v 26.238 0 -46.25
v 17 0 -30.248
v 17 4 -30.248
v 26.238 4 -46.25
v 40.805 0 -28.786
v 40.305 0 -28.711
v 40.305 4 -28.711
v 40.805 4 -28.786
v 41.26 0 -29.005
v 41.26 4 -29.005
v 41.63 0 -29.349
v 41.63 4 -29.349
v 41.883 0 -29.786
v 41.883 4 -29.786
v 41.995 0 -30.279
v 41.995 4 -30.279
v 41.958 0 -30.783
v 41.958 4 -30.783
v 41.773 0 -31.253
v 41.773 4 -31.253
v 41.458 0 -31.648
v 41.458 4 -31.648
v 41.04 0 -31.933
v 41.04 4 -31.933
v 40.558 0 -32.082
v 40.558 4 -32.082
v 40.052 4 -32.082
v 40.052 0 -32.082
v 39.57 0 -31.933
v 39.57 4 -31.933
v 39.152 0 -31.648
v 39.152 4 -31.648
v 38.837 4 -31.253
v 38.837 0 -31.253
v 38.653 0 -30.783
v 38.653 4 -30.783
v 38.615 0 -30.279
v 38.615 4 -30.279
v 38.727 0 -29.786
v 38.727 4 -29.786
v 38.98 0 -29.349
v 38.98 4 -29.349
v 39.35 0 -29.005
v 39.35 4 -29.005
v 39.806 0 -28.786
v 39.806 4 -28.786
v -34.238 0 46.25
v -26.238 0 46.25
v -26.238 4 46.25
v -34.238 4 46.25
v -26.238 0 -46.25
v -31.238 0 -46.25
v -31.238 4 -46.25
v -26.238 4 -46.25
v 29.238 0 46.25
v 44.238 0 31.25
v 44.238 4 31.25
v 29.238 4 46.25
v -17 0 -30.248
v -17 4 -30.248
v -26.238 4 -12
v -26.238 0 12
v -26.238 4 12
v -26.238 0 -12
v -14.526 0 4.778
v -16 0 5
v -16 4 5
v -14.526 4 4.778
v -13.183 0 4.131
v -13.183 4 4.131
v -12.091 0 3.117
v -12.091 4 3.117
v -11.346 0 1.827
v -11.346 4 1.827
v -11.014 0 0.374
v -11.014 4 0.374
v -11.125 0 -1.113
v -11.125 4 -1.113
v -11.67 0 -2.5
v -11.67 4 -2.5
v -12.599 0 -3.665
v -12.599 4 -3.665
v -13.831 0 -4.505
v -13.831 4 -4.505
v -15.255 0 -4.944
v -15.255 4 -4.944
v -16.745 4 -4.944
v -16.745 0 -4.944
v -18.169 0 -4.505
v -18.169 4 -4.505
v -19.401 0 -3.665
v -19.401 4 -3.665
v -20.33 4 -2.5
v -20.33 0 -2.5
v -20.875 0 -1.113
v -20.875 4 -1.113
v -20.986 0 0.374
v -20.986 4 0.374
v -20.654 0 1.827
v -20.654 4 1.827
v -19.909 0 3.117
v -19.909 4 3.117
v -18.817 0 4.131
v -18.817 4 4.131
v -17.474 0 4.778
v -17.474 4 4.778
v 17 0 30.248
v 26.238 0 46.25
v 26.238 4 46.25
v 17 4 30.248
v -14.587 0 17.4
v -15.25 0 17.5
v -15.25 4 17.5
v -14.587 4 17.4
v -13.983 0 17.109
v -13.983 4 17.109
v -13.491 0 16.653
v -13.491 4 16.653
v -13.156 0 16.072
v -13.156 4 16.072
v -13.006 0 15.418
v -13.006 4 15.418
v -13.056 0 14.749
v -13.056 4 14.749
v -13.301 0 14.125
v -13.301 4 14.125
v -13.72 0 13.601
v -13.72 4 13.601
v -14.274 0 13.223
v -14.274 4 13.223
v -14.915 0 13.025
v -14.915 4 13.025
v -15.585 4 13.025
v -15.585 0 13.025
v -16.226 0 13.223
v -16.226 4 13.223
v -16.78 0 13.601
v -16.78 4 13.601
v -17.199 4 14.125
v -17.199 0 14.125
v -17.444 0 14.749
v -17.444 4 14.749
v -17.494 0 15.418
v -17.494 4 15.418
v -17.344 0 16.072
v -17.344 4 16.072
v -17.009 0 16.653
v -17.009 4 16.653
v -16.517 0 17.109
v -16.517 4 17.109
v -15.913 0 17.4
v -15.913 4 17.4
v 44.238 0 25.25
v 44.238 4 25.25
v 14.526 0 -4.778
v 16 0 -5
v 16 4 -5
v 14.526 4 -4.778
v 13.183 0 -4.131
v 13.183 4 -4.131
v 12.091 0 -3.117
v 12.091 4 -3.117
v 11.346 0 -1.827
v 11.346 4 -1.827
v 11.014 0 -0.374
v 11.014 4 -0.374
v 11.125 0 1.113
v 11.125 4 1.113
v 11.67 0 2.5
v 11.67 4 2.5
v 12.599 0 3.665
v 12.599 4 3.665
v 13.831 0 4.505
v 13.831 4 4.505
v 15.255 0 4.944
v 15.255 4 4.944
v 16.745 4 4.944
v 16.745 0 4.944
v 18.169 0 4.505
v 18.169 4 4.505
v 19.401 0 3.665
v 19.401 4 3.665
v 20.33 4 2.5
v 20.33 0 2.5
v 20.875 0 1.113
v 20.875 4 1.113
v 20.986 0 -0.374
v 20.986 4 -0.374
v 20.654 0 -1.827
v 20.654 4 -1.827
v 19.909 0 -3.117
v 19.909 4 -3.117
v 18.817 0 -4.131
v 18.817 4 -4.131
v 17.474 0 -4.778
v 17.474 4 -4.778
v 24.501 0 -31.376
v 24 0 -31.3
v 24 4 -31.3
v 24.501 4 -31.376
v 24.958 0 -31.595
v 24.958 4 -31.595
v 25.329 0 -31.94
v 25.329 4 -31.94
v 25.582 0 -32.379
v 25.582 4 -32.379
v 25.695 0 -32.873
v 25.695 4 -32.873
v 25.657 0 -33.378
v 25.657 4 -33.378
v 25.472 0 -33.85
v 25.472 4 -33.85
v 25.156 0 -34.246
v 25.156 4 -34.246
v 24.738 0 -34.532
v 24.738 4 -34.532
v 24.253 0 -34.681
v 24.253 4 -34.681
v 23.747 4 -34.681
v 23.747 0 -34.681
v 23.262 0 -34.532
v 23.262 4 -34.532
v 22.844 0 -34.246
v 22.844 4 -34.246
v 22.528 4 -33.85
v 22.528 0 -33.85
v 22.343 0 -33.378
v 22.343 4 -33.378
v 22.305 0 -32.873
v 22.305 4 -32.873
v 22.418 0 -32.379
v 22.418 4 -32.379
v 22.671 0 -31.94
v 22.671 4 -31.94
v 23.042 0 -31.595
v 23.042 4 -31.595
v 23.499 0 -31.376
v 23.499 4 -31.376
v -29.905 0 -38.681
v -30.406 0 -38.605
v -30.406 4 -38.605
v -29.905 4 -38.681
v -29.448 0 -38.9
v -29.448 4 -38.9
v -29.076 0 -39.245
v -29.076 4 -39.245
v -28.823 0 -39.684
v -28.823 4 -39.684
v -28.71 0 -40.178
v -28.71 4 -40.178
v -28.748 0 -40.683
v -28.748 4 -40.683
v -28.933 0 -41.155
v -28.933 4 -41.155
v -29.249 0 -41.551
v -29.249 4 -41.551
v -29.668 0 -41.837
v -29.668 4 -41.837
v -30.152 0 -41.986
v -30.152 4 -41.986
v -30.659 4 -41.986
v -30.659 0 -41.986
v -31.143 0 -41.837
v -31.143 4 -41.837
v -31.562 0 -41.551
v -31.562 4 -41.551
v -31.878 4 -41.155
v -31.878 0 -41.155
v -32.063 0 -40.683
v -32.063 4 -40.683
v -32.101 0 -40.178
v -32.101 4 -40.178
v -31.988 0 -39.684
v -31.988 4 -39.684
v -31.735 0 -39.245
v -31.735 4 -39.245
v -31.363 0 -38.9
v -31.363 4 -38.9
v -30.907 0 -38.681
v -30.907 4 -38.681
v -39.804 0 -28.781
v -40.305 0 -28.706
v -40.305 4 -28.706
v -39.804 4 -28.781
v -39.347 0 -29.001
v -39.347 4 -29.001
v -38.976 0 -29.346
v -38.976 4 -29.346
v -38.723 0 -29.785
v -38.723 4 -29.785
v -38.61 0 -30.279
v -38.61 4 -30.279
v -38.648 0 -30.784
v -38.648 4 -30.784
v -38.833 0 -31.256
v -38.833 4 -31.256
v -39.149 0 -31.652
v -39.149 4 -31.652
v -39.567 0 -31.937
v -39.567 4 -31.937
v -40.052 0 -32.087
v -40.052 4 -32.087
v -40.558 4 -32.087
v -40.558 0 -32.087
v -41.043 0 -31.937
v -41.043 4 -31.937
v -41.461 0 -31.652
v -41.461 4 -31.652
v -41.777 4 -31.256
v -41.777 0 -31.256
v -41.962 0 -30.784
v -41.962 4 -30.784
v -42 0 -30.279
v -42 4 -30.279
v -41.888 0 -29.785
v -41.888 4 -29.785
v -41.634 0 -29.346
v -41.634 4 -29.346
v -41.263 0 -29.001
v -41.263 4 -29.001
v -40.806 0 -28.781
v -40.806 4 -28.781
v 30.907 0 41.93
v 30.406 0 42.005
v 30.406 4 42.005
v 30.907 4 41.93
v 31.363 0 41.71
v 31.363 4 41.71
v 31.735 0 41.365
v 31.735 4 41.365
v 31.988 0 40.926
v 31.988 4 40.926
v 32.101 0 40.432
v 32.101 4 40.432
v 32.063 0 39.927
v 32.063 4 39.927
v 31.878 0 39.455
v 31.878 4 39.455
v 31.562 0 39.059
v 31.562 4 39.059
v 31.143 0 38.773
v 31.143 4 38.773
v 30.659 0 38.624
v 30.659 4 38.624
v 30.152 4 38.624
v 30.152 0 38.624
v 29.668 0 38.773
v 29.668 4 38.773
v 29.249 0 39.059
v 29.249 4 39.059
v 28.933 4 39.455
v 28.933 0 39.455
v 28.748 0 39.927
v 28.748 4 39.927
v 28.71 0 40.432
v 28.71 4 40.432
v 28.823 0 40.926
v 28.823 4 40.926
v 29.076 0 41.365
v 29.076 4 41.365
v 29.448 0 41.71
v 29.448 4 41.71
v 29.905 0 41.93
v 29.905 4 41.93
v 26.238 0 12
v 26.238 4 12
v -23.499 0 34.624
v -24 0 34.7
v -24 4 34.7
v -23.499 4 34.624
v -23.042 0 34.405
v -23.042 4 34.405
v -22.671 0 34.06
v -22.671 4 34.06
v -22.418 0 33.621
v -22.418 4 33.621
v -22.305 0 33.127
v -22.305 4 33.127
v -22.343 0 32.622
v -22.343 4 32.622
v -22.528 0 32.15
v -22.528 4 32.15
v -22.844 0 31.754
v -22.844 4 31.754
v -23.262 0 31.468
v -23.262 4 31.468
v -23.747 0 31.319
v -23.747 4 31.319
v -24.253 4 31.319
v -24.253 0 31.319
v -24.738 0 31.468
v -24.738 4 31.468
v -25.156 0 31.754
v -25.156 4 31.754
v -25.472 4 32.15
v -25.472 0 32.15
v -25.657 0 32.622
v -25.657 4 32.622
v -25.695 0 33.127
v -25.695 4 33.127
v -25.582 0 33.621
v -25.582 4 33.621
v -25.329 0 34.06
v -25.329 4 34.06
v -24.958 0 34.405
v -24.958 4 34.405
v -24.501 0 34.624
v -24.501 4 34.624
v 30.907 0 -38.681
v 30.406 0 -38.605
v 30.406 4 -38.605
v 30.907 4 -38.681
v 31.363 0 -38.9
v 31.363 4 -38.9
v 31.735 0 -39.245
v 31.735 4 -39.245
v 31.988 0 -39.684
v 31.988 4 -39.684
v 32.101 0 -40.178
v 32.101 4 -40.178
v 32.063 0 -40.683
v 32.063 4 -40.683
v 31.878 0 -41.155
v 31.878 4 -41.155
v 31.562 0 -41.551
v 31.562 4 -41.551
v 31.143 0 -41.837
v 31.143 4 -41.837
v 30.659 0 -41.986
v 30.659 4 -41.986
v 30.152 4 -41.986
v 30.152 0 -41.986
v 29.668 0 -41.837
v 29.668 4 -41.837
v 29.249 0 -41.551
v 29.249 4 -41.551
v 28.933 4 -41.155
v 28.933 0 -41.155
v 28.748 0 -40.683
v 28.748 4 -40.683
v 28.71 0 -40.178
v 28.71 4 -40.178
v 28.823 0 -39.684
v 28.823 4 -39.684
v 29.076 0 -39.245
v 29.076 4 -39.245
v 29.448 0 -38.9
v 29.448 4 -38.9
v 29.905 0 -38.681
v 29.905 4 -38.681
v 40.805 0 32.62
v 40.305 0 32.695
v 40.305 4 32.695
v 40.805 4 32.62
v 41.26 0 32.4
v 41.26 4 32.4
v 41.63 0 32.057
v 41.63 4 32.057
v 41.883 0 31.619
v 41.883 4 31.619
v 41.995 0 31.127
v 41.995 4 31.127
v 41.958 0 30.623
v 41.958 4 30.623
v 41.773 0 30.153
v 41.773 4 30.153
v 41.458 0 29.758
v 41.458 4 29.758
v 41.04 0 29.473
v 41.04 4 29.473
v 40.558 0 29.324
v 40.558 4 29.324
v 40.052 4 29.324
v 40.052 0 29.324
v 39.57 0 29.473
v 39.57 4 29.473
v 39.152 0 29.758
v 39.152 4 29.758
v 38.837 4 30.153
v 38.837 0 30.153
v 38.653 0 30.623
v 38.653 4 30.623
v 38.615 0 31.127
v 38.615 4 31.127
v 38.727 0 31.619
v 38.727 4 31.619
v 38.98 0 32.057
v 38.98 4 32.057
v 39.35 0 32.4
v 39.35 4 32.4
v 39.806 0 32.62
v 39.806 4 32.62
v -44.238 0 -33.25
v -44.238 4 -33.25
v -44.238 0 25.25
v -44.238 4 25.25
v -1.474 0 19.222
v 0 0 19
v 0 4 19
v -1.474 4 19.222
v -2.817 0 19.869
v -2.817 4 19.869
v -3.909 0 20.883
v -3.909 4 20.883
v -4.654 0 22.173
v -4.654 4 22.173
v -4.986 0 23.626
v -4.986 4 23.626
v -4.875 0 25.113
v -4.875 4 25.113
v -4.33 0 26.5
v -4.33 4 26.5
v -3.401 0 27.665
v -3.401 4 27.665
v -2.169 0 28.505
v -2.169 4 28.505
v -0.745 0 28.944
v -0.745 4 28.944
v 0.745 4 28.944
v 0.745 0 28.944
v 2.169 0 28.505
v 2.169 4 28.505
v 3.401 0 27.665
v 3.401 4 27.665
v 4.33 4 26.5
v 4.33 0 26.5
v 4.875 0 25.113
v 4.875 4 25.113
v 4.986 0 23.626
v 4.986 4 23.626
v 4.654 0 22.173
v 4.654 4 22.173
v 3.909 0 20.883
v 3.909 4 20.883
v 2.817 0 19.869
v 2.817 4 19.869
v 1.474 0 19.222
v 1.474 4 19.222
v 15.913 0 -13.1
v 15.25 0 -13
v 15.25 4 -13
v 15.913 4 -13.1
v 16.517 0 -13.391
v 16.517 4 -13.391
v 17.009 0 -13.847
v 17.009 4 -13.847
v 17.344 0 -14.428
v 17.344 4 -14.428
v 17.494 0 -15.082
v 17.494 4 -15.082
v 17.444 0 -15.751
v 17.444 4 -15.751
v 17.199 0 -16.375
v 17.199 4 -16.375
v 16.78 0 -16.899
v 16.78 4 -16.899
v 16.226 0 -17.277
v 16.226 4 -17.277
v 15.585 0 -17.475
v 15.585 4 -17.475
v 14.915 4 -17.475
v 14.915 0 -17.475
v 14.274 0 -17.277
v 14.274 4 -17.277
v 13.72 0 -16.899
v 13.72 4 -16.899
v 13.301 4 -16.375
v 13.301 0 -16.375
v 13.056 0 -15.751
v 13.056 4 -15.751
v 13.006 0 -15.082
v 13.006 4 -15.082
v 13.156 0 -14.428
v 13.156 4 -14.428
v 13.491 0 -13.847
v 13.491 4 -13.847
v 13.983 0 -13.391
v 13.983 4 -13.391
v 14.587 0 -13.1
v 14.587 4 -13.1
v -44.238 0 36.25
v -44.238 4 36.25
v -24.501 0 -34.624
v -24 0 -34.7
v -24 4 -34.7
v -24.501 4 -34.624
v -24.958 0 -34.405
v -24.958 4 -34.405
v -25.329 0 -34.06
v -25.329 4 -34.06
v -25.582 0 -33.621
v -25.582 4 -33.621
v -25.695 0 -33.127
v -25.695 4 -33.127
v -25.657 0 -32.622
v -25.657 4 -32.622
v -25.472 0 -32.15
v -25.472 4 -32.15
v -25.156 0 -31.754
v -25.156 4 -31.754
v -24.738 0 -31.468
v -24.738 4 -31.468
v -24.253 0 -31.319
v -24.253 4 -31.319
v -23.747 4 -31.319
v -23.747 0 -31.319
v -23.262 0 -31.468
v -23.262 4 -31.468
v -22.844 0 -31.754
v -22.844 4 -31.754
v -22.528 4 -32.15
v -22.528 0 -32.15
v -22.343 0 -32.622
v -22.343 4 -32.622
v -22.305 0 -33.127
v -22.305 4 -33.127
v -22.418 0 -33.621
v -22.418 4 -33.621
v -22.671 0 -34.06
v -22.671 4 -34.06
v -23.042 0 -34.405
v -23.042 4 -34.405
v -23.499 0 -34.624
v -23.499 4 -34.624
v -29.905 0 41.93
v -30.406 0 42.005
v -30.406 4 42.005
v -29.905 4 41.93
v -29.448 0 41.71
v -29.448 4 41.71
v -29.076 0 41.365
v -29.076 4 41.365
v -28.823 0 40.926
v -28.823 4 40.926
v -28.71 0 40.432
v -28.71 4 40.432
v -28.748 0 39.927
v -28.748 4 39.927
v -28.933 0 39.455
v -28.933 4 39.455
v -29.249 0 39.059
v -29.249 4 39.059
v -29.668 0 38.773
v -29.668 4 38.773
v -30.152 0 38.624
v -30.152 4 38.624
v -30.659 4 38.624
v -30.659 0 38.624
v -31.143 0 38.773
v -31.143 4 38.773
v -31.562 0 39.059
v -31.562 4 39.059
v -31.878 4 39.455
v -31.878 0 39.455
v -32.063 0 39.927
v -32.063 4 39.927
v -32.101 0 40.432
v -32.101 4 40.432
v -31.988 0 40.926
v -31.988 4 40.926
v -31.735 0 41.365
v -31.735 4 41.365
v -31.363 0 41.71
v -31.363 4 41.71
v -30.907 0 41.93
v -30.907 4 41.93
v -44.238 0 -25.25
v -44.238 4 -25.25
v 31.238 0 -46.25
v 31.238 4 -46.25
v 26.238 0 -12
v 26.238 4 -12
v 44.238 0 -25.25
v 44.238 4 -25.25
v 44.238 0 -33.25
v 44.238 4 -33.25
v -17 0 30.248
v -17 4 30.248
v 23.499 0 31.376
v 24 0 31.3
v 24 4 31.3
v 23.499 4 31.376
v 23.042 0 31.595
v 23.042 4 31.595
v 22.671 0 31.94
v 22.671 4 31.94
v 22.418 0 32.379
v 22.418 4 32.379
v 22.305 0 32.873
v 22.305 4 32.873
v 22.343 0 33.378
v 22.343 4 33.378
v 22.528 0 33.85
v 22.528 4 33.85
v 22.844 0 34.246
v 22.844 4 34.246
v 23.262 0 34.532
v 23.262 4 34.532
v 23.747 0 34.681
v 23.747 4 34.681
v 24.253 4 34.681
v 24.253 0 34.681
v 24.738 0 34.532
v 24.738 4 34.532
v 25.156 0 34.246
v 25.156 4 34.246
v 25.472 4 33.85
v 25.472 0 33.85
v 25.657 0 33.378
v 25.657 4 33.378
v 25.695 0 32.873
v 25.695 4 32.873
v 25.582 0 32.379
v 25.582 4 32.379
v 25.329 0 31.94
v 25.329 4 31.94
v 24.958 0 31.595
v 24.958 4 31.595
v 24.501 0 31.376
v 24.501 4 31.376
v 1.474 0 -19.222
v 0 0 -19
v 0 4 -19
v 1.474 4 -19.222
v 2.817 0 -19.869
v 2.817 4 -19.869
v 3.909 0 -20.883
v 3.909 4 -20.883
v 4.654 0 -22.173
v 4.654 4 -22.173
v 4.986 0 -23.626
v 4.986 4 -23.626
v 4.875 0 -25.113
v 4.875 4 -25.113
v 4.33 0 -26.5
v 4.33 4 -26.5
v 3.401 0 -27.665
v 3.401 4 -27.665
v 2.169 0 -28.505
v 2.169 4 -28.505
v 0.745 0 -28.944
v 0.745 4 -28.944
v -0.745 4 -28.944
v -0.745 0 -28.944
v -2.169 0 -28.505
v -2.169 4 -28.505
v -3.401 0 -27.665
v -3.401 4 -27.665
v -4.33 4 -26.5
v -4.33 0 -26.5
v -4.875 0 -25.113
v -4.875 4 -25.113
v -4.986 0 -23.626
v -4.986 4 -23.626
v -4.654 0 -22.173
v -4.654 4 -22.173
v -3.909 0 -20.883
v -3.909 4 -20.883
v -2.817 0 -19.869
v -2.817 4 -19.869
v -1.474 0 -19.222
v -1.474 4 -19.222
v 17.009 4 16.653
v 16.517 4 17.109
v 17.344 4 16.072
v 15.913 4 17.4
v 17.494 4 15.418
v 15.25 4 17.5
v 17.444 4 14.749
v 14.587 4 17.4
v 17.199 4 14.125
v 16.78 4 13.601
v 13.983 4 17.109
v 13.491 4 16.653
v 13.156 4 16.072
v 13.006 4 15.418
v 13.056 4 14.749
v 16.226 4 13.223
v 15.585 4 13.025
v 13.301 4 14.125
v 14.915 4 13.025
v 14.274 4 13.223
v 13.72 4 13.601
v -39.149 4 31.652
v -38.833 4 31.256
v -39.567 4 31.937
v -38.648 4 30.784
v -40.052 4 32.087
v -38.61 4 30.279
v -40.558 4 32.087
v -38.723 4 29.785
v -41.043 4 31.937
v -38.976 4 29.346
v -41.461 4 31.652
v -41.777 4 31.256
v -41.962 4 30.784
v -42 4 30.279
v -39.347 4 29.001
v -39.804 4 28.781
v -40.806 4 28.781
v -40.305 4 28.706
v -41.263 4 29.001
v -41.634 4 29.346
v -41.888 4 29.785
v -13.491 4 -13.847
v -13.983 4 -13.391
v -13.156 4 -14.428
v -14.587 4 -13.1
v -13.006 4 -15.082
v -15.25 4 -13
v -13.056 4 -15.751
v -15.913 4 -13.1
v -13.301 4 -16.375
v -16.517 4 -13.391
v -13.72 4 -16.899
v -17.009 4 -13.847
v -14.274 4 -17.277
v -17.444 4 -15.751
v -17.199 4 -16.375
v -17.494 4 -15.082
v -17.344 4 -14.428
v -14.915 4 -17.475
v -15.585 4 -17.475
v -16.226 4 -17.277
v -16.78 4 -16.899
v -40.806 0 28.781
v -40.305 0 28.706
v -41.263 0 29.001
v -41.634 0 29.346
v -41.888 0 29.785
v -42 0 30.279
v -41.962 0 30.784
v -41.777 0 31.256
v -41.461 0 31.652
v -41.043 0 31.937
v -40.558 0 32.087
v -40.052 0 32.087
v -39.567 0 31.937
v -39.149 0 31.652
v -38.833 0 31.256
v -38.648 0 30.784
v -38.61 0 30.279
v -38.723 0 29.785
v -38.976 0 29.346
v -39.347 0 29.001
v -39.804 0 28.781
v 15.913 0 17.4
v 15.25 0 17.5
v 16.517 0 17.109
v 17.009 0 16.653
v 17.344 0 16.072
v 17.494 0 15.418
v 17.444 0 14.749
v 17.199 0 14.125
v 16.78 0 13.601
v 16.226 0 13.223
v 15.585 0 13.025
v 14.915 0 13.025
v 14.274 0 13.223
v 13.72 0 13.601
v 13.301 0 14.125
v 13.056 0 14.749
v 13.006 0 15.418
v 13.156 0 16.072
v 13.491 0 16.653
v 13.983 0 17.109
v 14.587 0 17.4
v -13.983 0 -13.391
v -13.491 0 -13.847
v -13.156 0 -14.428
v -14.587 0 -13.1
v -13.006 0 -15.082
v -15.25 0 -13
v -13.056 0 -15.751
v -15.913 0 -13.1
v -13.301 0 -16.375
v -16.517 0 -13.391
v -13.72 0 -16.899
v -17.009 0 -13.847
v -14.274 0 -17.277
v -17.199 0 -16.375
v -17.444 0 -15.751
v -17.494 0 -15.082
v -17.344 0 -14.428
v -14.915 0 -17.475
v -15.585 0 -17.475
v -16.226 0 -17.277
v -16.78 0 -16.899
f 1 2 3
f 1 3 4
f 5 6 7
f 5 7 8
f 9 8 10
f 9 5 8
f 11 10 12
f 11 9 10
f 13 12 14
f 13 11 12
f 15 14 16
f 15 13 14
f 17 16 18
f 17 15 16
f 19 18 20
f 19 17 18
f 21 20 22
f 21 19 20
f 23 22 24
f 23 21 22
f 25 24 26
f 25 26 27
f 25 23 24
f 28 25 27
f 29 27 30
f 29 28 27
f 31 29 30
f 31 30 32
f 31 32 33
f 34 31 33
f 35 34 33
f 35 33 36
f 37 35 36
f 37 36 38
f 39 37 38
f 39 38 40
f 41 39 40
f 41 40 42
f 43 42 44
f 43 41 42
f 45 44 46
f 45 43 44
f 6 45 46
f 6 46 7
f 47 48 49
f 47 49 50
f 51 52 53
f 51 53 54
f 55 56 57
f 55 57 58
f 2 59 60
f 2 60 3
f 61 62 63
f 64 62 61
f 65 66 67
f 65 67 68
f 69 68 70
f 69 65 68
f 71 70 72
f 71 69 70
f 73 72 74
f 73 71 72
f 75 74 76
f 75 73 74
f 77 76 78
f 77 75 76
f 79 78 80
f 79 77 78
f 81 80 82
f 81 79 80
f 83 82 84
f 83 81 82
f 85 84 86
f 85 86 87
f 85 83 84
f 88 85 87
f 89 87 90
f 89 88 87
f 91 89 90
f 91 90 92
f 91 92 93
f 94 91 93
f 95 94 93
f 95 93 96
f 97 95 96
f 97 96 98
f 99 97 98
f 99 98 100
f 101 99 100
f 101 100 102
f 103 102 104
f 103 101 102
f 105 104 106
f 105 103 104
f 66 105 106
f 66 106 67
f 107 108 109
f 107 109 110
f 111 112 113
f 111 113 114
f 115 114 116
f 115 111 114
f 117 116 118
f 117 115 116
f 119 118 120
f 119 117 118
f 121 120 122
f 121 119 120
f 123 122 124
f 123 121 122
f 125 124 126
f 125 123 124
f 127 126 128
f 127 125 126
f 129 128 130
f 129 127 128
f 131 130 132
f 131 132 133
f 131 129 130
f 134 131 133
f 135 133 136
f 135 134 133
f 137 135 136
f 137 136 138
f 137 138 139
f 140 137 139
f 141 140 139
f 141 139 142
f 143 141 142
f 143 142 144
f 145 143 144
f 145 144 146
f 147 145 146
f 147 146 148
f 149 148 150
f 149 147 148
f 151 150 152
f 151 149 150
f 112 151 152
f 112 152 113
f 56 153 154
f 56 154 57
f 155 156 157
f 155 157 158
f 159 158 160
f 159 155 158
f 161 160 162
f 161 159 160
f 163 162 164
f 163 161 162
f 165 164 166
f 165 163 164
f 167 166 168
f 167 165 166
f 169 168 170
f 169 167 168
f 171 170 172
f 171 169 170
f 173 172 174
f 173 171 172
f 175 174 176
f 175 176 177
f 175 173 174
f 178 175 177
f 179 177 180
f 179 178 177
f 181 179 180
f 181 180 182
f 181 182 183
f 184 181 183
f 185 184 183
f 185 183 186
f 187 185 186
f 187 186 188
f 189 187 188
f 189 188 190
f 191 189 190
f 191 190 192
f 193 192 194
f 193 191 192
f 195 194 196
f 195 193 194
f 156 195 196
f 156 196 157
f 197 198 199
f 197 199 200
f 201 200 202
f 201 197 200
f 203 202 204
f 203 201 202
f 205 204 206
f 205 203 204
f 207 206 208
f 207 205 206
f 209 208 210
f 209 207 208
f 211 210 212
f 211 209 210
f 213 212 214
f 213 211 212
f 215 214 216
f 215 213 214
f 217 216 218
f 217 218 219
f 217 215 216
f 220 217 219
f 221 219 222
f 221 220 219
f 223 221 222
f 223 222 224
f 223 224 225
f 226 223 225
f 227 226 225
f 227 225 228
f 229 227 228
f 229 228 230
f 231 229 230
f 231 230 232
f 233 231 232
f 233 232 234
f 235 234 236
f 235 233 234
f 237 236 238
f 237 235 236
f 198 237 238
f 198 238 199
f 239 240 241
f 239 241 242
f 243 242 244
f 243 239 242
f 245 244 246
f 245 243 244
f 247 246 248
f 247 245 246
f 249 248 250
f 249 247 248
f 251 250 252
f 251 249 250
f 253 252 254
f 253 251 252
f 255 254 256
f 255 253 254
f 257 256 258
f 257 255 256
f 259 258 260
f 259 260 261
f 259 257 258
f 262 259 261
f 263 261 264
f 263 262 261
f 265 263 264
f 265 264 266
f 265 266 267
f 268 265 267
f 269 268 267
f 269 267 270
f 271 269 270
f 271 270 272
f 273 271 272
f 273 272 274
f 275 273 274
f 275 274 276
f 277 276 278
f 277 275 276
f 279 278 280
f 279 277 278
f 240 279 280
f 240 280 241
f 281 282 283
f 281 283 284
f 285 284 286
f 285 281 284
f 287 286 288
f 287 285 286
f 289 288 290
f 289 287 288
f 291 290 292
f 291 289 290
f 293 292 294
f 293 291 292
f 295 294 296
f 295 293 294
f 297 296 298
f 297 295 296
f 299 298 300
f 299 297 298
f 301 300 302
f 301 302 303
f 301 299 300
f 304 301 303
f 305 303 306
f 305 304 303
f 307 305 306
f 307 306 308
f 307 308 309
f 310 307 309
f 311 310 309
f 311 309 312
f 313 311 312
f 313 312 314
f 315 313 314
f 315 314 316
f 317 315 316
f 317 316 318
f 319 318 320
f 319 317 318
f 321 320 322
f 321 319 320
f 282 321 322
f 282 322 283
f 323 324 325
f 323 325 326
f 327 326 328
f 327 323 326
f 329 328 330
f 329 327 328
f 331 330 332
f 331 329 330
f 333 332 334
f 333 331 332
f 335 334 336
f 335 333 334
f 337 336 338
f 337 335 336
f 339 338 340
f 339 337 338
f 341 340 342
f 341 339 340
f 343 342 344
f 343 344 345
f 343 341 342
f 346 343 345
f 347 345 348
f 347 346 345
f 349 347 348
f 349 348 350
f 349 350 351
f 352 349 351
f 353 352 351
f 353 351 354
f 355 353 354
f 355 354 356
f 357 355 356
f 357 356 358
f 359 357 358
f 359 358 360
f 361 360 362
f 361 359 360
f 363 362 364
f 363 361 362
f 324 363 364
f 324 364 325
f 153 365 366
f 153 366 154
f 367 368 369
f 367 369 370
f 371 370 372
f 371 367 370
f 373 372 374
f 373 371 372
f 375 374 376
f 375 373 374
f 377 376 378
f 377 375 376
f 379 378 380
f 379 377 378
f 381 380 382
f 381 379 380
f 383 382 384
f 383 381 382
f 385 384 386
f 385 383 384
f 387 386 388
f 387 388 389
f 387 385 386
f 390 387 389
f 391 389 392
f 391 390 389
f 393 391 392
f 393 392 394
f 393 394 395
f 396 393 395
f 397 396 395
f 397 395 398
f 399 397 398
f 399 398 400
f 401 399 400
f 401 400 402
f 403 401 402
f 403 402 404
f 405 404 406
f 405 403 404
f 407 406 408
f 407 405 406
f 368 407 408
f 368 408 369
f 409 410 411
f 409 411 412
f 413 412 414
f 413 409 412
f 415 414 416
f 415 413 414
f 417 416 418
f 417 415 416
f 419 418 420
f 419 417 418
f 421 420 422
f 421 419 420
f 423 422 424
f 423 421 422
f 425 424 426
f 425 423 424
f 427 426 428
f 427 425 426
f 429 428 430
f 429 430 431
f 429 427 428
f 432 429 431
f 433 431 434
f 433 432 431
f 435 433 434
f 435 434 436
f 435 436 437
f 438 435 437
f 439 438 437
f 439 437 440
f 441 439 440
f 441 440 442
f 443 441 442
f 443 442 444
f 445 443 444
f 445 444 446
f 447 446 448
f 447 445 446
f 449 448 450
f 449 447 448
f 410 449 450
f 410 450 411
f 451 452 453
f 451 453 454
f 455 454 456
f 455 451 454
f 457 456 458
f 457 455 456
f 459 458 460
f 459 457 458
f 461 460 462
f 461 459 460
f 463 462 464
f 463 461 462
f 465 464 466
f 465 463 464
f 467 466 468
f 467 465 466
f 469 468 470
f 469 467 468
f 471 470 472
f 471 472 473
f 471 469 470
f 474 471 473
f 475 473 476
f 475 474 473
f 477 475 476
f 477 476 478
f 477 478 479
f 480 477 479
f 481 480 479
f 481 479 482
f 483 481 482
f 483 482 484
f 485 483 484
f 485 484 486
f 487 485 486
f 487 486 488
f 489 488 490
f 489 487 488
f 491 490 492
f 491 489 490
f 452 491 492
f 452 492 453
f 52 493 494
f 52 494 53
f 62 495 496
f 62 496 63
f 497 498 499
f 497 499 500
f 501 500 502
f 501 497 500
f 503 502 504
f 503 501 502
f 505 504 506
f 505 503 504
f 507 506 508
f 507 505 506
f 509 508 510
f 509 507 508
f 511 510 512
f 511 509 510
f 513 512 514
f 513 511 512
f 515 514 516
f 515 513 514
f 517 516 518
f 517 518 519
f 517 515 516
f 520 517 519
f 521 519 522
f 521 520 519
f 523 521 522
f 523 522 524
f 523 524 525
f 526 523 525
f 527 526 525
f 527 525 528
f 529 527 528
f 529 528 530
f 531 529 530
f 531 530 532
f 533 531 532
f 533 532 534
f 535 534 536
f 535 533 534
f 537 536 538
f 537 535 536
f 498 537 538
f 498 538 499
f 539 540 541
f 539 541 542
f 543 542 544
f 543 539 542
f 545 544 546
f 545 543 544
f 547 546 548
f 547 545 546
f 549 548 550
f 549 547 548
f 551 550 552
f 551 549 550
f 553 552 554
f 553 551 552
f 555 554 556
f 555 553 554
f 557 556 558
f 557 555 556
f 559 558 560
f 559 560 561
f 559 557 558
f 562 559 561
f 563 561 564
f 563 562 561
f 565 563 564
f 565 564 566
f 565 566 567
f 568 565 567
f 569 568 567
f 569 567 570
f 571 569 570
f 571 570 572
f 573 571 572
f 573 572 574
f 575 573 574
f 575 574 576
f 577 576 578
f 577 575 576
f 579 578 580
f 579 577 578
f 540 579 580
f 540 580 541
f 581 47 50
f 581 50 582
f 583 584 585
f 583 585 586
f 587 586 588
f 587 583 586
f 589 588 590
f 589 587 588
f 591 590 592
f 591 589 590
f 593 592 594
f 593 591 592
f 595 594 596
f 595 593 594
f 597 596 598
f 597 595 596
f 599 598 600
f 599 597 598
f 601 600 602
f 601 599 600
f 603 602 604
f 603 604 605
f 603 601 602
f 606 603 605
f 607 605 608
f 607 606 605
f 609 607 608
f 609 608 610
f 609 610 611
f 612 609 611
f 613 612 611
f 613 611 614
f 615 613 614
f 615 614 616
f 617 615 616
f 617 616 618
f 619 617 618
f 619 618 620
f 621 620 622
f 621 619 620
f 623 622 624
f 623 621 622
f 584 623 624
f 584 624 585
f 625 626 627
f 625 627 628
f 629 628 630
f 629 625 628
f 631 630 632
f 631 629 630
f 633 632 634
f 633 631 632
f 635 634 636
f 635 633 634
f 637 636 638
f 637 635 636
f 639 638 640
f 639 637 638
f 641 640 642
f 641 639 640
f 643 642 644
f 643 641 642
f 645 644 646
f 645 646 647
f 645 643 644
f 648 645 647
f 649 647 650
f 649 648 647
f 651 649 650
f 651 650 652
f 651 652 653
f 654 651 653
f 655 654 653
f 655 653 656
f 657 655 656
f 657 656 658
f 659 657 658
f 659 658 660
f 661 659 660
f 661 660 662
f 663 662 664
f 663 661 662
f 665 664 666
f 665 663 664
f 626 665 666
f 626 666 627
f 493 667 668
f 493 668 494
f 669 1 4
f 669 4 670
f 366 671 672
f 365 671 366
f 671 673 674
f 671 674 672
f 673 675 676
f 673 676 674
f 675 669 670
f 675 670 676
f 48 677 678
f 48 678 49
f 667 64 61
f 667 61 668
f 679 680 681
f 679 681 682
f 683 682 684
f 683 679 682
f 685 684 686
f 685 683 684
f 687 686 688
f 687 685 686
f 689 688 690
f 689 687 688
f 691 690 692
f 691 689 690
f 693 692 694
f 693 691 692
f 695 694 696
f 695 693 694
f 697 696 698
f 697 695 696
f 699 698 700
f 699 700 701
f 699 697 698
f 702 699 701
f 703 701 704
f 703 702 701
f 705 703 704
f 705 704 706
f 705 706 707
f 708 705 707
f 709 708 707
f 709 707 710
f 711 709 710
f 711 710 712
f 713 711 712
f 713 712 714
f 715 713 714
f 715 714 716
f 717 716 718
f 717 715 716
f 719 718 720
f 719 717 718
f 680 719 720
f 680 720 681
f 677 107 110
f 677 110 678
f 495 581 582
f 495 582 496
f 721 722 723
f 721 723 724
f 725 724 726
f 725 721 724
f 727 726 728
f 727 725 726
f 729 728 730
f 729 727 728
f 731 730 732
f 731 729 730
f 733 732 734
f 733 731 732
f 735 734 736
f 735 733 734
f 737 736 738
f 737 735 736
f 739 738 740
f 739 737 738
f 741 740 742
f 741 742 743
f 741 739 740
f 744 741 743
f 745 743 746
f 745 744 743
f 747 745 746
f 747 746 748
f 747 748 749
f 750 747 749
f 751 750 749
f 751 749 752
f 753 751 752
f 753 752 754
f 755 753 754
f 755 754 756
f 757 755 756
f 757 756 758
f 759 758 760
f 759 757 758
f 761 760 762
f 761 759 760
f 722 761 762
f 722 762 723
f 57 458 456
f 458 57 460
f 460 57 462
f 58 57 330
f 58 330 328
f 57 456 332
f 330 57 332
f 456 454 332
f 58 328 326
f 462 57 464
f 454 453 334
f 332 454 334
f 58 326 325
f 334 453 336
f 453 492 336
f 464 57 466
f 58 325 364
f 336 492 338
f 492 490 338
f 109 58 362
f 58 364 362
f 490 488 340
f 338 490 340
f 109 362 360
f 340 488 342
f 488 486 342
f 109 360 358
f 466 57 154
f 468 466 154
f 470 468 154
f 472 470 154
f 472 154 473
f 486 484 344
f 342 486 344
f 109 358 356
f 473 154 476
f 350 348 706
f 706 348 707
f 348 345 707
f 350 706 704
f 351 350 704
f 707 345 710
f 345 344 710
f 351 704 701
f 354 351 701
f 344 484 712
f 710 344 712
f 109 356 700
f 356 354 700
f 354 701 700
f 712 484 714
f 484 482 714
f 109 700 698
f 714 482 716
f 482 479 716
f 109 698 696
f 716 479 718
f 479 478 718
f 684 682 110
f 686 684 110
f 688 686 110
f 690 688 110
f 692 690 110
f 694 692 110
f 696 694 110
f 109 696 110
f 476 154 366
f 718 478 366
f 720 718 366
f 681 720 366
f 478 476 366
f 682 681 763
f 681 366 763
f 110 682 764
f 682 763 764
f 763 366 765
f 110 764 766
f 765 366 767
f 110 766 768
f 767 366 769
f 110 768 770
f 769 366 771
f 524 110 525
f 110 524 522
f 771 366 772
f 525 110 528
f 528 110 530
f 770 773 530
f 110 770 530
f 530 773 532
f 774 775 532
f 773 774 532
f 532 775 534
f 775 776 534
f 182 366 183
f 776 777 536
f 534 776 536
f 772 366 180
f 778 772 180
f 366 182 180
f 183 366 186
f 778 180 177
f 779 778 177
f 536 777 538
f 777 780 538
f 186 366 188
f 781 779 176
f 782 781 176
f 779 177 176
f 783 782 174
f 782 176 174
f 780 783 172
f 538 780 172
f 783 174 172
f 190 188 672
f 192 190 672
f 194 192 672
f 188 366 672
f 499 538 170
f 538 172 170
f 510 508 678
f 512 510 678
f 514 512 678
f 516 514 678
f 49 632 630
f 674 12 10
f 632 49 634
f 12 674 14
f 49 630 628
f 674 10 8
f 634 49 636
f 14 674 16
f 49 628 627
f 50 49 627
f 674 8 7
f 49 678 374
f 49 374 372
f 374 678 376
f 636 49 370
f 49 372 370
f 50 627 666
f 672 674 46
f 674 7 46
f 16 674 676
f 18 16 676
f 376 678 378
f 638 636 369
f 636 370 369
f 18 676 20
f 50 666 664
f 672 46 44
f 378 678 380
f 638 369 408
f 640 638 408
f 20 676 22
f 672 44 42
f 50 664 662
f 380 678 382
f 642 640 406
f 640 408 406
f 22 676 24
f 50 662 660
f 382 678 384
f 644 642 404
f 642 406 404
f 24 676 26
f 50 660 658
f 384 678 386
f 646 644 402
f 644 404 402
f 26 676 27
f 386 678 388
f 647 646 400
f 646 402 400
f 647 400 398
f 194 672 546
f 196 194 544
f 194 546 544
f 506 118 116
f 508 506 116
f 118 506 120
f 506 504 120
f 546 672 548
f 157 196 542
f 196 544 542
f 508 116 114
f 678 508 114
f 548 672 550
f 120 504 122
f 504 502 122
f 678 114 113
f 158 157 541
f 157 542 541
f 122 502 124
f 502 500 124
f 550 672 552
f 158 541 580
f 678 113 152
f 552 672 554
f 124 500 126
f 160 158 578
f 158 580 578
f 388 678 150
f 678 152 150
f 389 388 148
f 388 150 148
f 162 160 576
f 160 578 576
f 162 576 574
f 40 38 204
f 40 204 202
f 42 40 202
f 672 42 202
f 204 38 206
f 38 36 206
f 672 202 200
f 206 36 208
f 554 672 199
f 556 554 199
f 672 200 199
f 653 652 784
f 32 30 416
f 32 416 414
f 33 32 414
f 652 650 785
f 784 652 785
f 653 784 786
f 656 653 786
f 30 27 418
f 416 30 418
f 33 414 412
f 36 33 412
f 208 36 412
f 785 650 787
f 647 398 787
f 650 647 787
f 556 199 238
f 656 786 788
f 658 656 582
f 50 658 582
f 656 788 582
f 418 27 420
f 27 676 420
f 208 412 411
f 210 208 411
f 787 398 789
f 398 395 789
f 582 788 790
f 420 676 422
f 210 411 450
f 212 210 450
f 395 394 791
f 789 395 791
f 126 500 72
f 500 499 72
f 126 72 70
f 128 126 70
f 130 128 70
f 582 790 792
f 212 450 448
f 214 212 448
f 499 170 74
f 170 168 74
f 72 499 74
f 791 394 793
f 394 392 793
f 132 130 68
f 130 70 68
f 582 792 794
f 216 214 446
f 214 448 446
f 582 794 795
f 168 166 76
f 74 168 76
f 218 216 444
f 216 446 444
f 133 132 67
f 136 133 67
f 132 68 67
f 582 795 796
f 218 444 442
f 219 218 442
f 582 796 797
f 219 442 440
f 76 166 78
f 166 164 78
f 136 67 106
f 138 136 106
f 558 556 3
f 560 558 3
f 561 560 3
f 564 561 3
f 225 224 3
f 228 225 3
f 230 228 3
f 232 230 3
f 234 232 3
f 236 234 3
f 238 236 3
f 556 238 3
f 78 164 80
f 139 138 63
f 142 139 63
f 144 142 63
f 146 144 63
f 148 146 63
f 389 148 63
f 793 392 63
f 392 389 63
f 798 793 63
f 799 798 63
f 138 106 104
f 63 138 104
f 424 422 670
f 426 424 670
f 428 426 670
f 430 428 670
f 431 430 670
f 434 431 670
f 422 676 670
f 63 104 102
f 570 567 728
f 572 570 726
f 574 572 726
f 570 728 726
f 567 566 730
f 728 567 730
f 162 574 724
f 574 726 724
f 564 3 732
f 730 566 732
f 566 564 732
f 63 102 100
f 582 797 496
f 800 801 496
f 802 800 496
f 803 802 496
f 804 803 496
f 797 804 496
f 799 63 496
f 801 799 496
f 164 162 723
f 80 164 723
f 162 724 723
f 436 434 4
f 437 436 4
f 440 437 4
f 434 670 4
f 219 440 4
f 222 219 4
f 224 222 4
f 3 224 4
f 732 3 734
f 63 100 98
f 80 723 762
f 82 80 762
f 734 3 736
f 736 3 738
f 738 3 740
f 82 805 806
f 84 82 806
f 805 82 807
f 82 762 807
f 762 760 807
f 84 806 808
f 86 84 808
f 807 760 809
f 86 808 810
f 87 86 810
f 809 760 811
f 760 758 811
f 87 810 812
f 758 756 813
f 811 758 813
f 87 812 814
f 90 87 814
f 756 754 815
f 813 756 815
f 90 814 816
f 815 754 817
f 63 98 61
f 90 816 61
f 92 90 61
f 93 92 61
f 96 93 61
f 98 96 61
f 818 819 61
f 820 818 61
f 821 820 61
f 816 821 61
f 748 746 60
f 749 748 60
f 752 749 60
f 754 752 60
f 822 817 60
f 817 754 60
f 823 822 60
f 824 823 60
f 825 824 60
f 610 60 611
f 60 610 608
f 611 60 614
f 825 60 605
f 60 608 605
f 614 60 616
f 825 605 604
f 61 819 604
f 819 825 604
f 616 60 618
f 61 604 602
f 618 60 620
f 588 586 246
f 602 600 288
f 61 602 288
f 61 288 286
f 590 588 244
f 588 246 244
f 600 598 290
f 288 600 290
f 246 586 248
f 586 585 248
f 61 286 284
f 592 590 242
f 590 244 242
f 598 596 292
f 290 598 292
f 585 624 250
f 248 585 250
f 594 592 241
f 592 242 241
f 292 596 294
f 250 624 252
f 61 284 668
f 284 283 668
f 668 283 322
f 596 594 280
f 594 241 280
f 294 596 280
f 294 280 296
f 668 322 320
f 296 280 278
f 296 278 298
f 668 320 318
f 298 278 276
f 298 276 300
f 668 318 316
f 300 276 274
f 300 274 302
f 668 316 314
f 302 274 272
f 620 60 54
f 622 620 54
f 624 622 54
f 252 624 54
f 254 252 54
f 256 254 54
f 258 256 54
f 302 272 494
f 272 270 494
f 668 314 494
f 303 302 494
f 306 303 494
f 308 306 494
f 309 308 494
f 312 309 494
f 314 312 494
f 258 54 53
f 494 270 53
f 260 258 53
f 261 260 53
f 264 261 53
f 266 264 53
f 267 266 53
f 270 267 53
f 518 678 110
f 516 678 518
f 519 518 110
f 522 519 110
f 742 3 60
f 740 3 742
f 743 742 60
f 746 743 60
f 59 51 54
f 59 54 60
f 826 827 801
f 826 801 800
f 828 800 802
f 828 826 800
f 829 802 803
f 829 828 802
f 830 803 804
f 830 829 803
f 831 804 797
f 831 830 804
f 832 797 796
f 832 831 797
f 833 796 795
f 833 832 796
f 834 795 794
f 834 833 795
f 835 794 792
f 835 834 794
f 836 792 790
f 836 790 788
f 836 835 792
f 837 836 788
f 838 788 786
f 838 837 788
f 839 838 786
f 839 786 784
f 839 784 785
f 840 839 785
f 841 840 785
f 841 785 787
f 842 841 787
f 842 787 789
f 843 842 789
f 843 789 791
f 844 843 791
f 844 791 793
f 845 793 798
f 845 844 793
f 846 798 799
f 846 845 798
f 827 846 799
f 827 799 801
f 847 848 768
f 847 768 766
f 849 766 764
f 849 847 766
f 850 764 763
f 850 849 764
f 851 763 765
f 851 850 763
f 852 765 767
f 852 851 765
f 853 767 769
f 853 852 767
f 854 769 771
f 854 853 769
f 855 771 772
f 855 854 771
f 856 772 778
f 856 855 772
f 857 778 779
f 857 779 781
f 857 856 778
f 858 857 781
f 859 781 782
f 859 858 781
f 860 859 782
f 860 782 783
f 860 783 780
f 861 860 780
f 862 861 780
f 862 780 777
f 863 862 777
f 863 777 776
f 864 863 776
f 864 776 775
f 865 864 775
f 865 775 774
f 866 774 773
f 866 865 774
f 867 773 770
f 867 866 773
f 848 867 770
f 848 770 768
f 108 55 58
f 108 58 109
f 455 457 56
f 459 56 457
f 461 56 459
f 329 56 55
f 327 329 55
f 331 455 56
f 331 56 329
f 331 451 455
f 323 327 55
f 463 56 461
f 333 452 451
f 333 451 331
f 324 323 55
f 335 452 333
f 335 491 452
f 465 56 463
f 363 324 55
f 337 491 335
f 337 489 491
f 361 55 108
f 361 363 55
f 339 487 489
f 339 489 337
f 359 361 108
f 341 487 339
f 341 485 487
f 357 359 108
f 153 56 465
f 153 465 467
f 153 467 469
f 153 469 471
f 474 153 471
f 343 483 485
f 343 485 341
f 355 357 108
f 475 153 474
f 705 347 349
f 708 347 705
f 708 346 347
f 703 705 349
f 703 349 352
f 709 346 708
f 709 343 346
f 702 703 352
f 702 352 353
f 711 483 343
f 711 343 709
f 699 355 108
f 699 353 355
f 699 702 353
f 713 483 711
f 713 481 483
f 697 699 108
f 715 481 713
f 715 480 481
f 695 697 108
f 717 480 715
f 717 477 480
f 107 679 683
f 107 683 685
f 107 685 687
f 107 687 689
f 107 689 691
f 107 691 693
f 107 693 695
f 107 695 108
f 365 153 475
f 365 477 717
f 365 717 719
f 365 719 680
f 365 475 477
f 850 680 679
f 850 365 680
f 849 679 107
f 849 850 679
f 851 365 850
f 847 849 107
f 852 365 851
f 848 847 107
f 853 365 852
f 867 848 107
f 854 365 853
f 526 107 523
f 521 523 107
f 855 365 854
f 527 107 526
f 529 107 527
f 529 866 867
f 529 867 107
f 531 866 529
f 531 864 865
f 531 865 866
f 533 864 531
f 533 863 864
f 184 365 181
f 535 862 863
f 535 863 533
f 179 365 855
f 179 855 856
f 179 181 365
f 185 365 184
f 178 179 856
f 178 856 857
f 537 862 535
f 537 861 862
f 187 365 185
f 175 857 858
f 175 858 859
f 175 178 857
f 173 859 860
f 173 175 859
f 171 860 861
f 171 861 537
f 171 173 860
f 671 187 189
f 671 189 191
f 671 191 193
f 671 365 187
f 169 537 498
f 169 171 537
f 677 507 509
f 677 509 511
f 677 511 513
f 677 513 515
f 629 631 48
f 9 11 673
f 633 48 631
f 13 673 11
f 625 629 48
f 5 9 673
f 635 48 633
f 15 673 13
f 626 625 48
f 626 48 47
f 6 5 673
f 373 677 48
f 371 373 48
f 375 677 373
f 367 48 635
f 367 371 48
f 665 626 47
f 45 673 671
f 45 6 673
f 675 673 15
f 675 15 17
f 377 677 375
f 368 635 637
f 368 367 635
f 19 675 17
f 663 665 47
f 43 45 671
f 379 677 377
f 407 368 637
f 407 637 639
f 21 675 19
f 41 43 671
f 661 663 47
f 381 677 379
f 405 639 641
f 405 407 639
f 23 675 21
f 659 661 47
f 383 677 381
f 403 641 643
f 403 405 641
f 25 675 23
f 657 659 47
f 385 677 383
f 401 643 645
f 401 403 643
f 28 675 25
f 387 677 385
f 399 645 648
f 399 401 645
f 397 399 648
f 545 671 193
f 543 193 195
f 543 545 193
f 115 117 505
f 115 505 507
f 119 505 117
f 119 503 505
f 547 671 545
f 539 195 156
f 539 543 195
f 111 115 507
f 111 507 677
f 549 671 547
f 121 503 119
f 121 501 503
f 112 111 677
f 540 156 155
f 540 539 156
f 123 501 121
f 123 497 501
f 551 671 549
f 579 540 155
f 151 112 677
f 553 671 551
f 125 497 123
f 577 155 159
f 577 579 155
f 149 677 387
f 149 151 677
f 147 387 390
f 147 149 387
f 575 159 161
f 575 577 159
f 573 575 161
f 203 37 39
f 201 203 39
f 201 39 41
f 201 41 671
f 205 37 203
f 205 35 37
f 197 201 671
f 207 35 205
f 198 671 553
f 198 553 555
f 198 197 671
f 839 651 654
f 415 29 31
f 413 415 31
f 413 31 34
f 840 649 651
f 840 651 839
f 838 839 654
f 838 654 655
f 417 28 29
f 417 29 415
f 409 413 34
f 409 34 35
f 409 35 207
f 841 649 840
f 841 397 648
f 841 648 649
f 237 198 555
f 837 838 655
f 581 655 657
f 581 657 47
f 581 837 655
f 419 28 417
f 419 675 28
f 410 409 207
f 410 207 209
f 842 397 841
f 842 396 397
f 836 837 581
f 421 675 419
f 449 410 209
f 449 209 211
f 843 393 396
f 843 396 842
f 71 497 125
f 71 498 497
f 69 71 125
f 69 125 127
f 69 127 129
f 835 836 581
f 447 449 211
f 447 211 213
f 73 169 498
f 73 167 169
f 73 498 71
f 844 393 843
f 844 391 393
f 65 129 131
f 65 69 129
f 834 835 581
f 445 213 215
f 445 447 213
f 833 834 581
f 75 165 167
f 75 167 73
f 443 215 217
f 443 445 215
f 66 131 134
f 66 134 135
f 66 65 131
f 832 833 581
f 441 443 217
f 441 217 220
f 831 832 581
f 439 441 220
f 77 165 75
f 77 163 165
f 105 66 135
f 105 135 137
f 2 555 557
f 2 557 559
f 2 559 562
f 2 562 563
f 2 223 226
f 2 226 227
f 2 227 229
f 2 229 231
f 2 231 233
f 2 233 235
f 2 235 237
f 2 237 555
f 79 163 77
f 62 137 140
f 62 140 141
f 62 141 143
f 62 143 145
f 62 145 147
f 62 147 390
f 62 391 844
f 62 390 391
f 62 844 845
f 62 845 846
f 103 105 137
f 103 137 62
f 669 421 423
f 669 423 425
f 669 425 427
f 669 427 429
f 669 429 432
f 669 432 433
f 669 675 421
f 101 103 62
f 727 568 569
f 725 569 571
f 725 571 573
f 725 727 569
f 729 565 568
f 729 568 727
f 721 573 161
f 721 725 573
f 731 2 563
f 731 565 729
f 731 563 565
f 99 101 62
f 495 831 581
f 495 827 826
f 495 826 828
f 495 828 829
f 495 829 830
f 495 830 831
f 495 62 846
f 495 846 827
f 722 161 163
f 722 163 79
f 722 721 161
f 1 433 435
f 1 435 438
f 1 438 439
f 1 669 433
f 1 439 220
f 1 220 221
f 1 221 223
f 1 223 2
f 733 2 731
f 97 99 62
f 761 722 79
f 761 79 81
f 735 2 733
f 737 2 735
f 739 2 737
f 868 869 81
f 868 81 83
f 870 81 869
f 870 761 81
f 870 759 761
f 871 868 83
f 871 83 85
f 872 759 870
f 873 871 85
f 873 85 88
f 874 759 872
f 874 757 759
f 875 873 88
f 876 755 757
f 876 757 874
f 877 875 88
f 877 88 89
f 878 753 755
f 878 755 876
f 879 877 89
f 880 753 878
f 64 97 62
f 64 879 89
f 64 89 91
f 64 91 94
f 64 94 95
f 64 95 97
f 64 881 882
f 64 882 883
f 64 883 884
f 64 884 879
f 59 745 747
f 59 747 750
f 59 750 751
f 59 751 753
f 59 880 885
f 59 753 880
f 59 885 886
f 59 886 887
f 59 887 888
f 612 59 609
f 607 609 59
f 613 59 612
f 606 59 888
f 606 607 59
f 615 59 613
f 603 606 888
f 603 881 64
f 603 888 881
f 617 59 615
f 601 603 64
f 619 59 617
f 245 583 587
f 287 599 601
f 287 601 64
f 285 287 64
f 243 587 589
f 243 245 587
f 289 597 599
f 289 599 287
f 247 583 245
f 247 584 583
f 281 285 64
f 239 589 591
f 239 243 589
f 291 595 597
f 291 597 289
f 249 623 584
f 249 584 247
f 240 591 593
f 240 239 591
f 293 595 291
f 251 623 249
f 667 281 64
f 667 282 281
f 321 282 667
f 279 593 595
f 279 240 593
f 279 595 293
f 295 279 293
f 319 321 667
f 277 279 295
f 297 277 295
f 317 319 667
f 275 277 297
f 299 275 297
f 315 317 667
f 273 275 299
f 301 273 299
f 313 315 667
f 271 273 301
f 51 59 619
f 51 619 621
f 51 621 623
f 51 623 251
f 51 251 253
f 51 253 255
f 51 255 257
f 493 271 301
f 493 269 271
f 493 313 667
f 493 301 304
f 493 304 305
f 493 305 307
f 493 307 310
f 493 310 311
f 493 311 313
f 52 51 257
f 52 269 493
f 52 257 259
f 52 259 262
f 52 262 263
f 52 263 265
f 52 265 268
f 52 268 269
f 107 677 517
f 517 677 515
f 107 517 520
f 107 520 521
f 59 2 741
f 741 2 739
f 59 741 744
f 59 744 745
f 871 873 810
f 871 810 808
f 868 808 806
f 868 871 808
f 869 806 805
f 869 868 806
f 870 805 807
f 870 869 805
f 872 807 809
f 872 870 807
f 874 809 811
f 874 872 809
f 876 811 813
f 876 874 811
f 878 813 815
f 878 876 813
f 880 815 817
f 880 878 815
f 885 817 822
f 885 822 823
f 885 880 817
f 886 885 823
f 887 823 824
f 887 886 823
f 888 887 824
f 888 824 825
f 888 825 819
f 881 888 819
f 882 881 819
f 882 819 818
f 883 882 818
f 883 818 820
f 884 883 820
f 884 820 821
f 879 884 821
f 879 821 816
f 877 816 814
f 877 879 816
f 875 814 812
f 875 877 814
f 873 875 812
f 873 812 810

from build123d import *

# Parameters (mm, degrees)
SKETCH_1_R      = 2.25
SKETCH_1_R_2    = 1.7
SKETCH_1_R_3    = 5
SKETCH_1_R_4    = 1.69491354
EXTRUDE_1_DEPTH = 4


with BuildPart() as part:
    # 草图1 → 凸台-拉伸1 (new body)
    with BuildSketch(Plane(origin=(0, 0, 0), x_dir=(1, 0, 0), z_dir=(0, 1, 0))):
        Polygon((44.23849367, 33.250010702), (44.23849367, 25.250010702), (26.23849367, 12), (26.23849367, -12), (44.23849367, -25.250010702), (44.23849367, -31.250010702), (29.23849367, -46.250010702), (26.23849367, -46.250010702), (17, -30.248470281), (-17, -30.248470281), (-26.23849367, -46.250010702), (-34.23849367, -46.250010702), (-44.23849367, -36.250010702), (-44.23849367, -25.250010702), (-26.23849367, -12), (-26.23849367, 12), (-44.23849367, 25.250010702), (-44.23849367, 33.250010702), (-31.23849367, 46.250010702), (-26.23849367, 46.250010702), (-17, 30.248470281), (17, 30.248470281), (26.23849367, 46.250010702), (31.23849367, 46.250010702), align=None)
        with Locations(Location((-15.25, -15.25, 0), (0, 0, 270))):
            Circle(SKETCH_1_R, mode=Mode.SUBTRACT)
        with Locations(Location((-15.25, 15.25, 0), (0, 0, 270))):
            Circle(SKETCH_1_R, mode=Mode.SUBTRACT)
        with Locations(Location((15.25, -15.25, 0), (0, 0, 270))):
            Circle(SKETCH_1_R, mode=Mode.SUBTRACT)
        with Locations(Location((15.25, 15.25, 0), (0, 0, 270))):
            Circle(SKETCH_1_R, mode=Mode.SUBTRACT)
        with Locations(Location((-24, -33, 0), (0, 0, 270))):
            Circle(SKETCH_1_R_2, mode=Mode.SUBTRACT)
        with Locations(Location((-16, 0, 0), (0, 0, 270))):
            Circle(SKETCH_1_R_3, mode=Mode.SUBTRACT)
        with Locations(Location((0, 24, 0), (0, 0, 270))):
            Circle(SKETCH_1_R_3, mode=Mode.SUBTRACT)
        with Locations(Location((-30.40559154, -40.30508646, 0), (0, 0, 270))):
            Circle(SKETCH_1_R_2, mode=Mode.SUBTRACT)
        with Locations(Location((-30.40559154, 40.30508646, 0), (0, 0, 270))):
            Circle(SKETCH_1_R_2, mode=Mode.SUBTRACT)
        with Locations(Location((-40.30508646, 30.40559154, 0), (0, 0, 270))):
            Circle(SKETCH_1_R_2, mode=Mode.SUBTRACT)
        with Locations(Location((30.40559154, -40.30508646, 0), (0, 0, 270))):
            Circle(SKETCH_1_R_2, mode=Mode.SUBTRACT)
        with Locations(Location((40.30508646, -31, 0), (0, 0, 270))):
            Circle(SKETCH_1_R_4, mode=Mode.SUBTRACT)
        with Locations(Location((40.30508646, 30.40559154, 0), (0, 0, 270))):
            Circle(SKETCH_1_R_4, mode=Mode.SUBTRACT)
        with Locations(Location((30.40559154, 40.30508646, 0), (0, 0, 270))):
            Circle(SKETCH_1_R_2, mode=Mode.SUBTRACT)
        with Locations(Location((-40.30508646, -30.40559154, 0), (0, 0, 90))):
            Circle(SKETCH_1_R_2, mode=Mode.SUBTRACT)
        with Locations(Location((24, -33, 0), (0, 0, 90))):
            Circle(SKETCH_1_R_2, mode=Mode.SUBTRACT)
        with Locations(Location((24, 33, 0), (0, 0, 270))):
            Circle(SKETCH_1_R_2, mode=Mode.SUBTRACT)
        with Locations(Location((-24, 33, 0), (0, 0, 90))):
            Circle(SKETCH_1_R_2, mode=Mode.SUBTRACT)
        with Locations(Location((16, 0, 0), (0, 0, 90))):
            Circle(SKETCH_1_R_3, mode=Mode.SUBTRACT)
        with Locations(Location((0, -24, 0), (0, 0, 90))):
            Circle(SKETCH_1_R_3, mode=Mode.SUBTRACT)
    extrude(amount=EXTRUDE_1_DEPTH)


solid = part.part
